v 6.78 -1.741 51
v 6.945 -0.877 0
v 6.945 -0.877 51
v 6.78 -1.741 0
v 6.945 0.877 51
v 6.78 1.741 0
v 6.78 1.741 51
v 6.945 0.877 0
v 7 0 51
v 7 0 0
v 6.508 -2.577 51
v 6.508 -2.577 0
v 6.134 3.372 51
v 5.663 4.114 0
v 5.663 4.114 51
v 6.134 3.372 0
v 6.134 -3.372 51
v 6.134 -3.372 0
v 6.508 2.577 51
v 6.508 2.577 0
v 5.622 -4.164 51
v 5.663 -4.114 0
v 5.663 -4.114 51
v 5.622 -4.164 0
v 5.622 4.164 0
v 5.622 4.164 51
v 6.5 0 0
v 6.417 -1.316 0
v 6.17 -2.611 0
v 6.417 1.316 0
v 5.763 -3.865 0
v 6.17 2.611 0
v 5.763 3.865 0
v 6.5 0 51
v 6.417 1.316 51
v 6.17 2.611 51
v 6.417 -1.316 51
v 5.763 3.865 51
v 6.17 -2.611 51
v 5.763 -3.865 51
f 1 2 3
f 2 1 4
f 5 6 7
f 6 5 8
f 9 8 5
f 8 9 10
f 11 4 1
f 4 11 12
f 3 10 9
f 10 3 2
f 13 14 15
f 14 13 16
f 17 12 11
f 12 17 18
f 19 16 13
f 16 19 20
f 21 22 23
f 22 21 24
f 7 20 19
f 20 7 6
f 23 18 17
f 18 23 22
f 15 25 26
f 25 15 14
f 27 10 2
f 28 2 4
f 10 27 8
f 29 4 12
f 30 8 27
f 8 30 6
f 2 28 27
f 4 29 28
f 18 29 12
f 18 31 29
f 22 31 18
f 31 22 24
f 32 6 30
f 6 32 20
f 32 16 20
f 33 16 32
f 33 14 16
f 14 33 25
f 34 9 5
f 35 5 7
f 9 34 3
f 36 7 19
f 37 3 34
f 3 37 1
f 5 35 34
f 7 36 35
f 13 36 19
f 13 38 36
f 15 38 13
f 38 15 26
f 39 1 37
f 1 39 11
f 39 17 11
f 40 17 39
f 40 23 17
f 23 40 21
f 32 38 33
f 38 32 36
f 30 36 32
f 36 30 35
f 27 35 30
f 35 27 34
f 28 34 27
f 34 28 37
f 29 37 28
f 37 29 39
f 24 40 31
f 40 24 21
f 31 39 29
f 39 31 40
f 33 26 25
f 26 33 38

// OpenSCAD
$fn = 50;


difference() {
	union() {
		cylinder(h = 51, r = 7.0000000000);
		translate(v = [-7.0000000000, 0, 0]) {
			cylinder(h = 51, r = 7.0000000000);
		}
	}
	union() {
		cylinder(h = 51, r = 3.2500000000);
		cylinder(h = 51, r = 1.8000000000);
		cylinder(h = 51, r = 1.8000000000);
		cylinder(h = 51, r = 1.8000000000);
		translate(v = [-11.5000000000, 0, 0]) {
			hull() {
				translate(v = [-3.7500000000, 0.0000000000, 0]) {
					cylinder(h = 51, r = 10.5000000000);
				}
				translate(v = [3.7500000000, 0.0000000000, 0]) {
					cylinder(h = 51, r = 10.5000000000);
				}
				translate(v = [-3.7500000000, -0.0000000000, 0]) {
					cylinder(h = 51, r = 10.5000000000);
				}
				translate(v = [3.7500000000, -0.0000000000, 0]) {
					cylinder(h = 51, r = 10.5000000000);
				}
			}
		}
		translate(v = [-4.0000000000, 0, 0.0000000000]) {
			cylinder(h = 51, r = 10.5000000000);
		}
	}
}
